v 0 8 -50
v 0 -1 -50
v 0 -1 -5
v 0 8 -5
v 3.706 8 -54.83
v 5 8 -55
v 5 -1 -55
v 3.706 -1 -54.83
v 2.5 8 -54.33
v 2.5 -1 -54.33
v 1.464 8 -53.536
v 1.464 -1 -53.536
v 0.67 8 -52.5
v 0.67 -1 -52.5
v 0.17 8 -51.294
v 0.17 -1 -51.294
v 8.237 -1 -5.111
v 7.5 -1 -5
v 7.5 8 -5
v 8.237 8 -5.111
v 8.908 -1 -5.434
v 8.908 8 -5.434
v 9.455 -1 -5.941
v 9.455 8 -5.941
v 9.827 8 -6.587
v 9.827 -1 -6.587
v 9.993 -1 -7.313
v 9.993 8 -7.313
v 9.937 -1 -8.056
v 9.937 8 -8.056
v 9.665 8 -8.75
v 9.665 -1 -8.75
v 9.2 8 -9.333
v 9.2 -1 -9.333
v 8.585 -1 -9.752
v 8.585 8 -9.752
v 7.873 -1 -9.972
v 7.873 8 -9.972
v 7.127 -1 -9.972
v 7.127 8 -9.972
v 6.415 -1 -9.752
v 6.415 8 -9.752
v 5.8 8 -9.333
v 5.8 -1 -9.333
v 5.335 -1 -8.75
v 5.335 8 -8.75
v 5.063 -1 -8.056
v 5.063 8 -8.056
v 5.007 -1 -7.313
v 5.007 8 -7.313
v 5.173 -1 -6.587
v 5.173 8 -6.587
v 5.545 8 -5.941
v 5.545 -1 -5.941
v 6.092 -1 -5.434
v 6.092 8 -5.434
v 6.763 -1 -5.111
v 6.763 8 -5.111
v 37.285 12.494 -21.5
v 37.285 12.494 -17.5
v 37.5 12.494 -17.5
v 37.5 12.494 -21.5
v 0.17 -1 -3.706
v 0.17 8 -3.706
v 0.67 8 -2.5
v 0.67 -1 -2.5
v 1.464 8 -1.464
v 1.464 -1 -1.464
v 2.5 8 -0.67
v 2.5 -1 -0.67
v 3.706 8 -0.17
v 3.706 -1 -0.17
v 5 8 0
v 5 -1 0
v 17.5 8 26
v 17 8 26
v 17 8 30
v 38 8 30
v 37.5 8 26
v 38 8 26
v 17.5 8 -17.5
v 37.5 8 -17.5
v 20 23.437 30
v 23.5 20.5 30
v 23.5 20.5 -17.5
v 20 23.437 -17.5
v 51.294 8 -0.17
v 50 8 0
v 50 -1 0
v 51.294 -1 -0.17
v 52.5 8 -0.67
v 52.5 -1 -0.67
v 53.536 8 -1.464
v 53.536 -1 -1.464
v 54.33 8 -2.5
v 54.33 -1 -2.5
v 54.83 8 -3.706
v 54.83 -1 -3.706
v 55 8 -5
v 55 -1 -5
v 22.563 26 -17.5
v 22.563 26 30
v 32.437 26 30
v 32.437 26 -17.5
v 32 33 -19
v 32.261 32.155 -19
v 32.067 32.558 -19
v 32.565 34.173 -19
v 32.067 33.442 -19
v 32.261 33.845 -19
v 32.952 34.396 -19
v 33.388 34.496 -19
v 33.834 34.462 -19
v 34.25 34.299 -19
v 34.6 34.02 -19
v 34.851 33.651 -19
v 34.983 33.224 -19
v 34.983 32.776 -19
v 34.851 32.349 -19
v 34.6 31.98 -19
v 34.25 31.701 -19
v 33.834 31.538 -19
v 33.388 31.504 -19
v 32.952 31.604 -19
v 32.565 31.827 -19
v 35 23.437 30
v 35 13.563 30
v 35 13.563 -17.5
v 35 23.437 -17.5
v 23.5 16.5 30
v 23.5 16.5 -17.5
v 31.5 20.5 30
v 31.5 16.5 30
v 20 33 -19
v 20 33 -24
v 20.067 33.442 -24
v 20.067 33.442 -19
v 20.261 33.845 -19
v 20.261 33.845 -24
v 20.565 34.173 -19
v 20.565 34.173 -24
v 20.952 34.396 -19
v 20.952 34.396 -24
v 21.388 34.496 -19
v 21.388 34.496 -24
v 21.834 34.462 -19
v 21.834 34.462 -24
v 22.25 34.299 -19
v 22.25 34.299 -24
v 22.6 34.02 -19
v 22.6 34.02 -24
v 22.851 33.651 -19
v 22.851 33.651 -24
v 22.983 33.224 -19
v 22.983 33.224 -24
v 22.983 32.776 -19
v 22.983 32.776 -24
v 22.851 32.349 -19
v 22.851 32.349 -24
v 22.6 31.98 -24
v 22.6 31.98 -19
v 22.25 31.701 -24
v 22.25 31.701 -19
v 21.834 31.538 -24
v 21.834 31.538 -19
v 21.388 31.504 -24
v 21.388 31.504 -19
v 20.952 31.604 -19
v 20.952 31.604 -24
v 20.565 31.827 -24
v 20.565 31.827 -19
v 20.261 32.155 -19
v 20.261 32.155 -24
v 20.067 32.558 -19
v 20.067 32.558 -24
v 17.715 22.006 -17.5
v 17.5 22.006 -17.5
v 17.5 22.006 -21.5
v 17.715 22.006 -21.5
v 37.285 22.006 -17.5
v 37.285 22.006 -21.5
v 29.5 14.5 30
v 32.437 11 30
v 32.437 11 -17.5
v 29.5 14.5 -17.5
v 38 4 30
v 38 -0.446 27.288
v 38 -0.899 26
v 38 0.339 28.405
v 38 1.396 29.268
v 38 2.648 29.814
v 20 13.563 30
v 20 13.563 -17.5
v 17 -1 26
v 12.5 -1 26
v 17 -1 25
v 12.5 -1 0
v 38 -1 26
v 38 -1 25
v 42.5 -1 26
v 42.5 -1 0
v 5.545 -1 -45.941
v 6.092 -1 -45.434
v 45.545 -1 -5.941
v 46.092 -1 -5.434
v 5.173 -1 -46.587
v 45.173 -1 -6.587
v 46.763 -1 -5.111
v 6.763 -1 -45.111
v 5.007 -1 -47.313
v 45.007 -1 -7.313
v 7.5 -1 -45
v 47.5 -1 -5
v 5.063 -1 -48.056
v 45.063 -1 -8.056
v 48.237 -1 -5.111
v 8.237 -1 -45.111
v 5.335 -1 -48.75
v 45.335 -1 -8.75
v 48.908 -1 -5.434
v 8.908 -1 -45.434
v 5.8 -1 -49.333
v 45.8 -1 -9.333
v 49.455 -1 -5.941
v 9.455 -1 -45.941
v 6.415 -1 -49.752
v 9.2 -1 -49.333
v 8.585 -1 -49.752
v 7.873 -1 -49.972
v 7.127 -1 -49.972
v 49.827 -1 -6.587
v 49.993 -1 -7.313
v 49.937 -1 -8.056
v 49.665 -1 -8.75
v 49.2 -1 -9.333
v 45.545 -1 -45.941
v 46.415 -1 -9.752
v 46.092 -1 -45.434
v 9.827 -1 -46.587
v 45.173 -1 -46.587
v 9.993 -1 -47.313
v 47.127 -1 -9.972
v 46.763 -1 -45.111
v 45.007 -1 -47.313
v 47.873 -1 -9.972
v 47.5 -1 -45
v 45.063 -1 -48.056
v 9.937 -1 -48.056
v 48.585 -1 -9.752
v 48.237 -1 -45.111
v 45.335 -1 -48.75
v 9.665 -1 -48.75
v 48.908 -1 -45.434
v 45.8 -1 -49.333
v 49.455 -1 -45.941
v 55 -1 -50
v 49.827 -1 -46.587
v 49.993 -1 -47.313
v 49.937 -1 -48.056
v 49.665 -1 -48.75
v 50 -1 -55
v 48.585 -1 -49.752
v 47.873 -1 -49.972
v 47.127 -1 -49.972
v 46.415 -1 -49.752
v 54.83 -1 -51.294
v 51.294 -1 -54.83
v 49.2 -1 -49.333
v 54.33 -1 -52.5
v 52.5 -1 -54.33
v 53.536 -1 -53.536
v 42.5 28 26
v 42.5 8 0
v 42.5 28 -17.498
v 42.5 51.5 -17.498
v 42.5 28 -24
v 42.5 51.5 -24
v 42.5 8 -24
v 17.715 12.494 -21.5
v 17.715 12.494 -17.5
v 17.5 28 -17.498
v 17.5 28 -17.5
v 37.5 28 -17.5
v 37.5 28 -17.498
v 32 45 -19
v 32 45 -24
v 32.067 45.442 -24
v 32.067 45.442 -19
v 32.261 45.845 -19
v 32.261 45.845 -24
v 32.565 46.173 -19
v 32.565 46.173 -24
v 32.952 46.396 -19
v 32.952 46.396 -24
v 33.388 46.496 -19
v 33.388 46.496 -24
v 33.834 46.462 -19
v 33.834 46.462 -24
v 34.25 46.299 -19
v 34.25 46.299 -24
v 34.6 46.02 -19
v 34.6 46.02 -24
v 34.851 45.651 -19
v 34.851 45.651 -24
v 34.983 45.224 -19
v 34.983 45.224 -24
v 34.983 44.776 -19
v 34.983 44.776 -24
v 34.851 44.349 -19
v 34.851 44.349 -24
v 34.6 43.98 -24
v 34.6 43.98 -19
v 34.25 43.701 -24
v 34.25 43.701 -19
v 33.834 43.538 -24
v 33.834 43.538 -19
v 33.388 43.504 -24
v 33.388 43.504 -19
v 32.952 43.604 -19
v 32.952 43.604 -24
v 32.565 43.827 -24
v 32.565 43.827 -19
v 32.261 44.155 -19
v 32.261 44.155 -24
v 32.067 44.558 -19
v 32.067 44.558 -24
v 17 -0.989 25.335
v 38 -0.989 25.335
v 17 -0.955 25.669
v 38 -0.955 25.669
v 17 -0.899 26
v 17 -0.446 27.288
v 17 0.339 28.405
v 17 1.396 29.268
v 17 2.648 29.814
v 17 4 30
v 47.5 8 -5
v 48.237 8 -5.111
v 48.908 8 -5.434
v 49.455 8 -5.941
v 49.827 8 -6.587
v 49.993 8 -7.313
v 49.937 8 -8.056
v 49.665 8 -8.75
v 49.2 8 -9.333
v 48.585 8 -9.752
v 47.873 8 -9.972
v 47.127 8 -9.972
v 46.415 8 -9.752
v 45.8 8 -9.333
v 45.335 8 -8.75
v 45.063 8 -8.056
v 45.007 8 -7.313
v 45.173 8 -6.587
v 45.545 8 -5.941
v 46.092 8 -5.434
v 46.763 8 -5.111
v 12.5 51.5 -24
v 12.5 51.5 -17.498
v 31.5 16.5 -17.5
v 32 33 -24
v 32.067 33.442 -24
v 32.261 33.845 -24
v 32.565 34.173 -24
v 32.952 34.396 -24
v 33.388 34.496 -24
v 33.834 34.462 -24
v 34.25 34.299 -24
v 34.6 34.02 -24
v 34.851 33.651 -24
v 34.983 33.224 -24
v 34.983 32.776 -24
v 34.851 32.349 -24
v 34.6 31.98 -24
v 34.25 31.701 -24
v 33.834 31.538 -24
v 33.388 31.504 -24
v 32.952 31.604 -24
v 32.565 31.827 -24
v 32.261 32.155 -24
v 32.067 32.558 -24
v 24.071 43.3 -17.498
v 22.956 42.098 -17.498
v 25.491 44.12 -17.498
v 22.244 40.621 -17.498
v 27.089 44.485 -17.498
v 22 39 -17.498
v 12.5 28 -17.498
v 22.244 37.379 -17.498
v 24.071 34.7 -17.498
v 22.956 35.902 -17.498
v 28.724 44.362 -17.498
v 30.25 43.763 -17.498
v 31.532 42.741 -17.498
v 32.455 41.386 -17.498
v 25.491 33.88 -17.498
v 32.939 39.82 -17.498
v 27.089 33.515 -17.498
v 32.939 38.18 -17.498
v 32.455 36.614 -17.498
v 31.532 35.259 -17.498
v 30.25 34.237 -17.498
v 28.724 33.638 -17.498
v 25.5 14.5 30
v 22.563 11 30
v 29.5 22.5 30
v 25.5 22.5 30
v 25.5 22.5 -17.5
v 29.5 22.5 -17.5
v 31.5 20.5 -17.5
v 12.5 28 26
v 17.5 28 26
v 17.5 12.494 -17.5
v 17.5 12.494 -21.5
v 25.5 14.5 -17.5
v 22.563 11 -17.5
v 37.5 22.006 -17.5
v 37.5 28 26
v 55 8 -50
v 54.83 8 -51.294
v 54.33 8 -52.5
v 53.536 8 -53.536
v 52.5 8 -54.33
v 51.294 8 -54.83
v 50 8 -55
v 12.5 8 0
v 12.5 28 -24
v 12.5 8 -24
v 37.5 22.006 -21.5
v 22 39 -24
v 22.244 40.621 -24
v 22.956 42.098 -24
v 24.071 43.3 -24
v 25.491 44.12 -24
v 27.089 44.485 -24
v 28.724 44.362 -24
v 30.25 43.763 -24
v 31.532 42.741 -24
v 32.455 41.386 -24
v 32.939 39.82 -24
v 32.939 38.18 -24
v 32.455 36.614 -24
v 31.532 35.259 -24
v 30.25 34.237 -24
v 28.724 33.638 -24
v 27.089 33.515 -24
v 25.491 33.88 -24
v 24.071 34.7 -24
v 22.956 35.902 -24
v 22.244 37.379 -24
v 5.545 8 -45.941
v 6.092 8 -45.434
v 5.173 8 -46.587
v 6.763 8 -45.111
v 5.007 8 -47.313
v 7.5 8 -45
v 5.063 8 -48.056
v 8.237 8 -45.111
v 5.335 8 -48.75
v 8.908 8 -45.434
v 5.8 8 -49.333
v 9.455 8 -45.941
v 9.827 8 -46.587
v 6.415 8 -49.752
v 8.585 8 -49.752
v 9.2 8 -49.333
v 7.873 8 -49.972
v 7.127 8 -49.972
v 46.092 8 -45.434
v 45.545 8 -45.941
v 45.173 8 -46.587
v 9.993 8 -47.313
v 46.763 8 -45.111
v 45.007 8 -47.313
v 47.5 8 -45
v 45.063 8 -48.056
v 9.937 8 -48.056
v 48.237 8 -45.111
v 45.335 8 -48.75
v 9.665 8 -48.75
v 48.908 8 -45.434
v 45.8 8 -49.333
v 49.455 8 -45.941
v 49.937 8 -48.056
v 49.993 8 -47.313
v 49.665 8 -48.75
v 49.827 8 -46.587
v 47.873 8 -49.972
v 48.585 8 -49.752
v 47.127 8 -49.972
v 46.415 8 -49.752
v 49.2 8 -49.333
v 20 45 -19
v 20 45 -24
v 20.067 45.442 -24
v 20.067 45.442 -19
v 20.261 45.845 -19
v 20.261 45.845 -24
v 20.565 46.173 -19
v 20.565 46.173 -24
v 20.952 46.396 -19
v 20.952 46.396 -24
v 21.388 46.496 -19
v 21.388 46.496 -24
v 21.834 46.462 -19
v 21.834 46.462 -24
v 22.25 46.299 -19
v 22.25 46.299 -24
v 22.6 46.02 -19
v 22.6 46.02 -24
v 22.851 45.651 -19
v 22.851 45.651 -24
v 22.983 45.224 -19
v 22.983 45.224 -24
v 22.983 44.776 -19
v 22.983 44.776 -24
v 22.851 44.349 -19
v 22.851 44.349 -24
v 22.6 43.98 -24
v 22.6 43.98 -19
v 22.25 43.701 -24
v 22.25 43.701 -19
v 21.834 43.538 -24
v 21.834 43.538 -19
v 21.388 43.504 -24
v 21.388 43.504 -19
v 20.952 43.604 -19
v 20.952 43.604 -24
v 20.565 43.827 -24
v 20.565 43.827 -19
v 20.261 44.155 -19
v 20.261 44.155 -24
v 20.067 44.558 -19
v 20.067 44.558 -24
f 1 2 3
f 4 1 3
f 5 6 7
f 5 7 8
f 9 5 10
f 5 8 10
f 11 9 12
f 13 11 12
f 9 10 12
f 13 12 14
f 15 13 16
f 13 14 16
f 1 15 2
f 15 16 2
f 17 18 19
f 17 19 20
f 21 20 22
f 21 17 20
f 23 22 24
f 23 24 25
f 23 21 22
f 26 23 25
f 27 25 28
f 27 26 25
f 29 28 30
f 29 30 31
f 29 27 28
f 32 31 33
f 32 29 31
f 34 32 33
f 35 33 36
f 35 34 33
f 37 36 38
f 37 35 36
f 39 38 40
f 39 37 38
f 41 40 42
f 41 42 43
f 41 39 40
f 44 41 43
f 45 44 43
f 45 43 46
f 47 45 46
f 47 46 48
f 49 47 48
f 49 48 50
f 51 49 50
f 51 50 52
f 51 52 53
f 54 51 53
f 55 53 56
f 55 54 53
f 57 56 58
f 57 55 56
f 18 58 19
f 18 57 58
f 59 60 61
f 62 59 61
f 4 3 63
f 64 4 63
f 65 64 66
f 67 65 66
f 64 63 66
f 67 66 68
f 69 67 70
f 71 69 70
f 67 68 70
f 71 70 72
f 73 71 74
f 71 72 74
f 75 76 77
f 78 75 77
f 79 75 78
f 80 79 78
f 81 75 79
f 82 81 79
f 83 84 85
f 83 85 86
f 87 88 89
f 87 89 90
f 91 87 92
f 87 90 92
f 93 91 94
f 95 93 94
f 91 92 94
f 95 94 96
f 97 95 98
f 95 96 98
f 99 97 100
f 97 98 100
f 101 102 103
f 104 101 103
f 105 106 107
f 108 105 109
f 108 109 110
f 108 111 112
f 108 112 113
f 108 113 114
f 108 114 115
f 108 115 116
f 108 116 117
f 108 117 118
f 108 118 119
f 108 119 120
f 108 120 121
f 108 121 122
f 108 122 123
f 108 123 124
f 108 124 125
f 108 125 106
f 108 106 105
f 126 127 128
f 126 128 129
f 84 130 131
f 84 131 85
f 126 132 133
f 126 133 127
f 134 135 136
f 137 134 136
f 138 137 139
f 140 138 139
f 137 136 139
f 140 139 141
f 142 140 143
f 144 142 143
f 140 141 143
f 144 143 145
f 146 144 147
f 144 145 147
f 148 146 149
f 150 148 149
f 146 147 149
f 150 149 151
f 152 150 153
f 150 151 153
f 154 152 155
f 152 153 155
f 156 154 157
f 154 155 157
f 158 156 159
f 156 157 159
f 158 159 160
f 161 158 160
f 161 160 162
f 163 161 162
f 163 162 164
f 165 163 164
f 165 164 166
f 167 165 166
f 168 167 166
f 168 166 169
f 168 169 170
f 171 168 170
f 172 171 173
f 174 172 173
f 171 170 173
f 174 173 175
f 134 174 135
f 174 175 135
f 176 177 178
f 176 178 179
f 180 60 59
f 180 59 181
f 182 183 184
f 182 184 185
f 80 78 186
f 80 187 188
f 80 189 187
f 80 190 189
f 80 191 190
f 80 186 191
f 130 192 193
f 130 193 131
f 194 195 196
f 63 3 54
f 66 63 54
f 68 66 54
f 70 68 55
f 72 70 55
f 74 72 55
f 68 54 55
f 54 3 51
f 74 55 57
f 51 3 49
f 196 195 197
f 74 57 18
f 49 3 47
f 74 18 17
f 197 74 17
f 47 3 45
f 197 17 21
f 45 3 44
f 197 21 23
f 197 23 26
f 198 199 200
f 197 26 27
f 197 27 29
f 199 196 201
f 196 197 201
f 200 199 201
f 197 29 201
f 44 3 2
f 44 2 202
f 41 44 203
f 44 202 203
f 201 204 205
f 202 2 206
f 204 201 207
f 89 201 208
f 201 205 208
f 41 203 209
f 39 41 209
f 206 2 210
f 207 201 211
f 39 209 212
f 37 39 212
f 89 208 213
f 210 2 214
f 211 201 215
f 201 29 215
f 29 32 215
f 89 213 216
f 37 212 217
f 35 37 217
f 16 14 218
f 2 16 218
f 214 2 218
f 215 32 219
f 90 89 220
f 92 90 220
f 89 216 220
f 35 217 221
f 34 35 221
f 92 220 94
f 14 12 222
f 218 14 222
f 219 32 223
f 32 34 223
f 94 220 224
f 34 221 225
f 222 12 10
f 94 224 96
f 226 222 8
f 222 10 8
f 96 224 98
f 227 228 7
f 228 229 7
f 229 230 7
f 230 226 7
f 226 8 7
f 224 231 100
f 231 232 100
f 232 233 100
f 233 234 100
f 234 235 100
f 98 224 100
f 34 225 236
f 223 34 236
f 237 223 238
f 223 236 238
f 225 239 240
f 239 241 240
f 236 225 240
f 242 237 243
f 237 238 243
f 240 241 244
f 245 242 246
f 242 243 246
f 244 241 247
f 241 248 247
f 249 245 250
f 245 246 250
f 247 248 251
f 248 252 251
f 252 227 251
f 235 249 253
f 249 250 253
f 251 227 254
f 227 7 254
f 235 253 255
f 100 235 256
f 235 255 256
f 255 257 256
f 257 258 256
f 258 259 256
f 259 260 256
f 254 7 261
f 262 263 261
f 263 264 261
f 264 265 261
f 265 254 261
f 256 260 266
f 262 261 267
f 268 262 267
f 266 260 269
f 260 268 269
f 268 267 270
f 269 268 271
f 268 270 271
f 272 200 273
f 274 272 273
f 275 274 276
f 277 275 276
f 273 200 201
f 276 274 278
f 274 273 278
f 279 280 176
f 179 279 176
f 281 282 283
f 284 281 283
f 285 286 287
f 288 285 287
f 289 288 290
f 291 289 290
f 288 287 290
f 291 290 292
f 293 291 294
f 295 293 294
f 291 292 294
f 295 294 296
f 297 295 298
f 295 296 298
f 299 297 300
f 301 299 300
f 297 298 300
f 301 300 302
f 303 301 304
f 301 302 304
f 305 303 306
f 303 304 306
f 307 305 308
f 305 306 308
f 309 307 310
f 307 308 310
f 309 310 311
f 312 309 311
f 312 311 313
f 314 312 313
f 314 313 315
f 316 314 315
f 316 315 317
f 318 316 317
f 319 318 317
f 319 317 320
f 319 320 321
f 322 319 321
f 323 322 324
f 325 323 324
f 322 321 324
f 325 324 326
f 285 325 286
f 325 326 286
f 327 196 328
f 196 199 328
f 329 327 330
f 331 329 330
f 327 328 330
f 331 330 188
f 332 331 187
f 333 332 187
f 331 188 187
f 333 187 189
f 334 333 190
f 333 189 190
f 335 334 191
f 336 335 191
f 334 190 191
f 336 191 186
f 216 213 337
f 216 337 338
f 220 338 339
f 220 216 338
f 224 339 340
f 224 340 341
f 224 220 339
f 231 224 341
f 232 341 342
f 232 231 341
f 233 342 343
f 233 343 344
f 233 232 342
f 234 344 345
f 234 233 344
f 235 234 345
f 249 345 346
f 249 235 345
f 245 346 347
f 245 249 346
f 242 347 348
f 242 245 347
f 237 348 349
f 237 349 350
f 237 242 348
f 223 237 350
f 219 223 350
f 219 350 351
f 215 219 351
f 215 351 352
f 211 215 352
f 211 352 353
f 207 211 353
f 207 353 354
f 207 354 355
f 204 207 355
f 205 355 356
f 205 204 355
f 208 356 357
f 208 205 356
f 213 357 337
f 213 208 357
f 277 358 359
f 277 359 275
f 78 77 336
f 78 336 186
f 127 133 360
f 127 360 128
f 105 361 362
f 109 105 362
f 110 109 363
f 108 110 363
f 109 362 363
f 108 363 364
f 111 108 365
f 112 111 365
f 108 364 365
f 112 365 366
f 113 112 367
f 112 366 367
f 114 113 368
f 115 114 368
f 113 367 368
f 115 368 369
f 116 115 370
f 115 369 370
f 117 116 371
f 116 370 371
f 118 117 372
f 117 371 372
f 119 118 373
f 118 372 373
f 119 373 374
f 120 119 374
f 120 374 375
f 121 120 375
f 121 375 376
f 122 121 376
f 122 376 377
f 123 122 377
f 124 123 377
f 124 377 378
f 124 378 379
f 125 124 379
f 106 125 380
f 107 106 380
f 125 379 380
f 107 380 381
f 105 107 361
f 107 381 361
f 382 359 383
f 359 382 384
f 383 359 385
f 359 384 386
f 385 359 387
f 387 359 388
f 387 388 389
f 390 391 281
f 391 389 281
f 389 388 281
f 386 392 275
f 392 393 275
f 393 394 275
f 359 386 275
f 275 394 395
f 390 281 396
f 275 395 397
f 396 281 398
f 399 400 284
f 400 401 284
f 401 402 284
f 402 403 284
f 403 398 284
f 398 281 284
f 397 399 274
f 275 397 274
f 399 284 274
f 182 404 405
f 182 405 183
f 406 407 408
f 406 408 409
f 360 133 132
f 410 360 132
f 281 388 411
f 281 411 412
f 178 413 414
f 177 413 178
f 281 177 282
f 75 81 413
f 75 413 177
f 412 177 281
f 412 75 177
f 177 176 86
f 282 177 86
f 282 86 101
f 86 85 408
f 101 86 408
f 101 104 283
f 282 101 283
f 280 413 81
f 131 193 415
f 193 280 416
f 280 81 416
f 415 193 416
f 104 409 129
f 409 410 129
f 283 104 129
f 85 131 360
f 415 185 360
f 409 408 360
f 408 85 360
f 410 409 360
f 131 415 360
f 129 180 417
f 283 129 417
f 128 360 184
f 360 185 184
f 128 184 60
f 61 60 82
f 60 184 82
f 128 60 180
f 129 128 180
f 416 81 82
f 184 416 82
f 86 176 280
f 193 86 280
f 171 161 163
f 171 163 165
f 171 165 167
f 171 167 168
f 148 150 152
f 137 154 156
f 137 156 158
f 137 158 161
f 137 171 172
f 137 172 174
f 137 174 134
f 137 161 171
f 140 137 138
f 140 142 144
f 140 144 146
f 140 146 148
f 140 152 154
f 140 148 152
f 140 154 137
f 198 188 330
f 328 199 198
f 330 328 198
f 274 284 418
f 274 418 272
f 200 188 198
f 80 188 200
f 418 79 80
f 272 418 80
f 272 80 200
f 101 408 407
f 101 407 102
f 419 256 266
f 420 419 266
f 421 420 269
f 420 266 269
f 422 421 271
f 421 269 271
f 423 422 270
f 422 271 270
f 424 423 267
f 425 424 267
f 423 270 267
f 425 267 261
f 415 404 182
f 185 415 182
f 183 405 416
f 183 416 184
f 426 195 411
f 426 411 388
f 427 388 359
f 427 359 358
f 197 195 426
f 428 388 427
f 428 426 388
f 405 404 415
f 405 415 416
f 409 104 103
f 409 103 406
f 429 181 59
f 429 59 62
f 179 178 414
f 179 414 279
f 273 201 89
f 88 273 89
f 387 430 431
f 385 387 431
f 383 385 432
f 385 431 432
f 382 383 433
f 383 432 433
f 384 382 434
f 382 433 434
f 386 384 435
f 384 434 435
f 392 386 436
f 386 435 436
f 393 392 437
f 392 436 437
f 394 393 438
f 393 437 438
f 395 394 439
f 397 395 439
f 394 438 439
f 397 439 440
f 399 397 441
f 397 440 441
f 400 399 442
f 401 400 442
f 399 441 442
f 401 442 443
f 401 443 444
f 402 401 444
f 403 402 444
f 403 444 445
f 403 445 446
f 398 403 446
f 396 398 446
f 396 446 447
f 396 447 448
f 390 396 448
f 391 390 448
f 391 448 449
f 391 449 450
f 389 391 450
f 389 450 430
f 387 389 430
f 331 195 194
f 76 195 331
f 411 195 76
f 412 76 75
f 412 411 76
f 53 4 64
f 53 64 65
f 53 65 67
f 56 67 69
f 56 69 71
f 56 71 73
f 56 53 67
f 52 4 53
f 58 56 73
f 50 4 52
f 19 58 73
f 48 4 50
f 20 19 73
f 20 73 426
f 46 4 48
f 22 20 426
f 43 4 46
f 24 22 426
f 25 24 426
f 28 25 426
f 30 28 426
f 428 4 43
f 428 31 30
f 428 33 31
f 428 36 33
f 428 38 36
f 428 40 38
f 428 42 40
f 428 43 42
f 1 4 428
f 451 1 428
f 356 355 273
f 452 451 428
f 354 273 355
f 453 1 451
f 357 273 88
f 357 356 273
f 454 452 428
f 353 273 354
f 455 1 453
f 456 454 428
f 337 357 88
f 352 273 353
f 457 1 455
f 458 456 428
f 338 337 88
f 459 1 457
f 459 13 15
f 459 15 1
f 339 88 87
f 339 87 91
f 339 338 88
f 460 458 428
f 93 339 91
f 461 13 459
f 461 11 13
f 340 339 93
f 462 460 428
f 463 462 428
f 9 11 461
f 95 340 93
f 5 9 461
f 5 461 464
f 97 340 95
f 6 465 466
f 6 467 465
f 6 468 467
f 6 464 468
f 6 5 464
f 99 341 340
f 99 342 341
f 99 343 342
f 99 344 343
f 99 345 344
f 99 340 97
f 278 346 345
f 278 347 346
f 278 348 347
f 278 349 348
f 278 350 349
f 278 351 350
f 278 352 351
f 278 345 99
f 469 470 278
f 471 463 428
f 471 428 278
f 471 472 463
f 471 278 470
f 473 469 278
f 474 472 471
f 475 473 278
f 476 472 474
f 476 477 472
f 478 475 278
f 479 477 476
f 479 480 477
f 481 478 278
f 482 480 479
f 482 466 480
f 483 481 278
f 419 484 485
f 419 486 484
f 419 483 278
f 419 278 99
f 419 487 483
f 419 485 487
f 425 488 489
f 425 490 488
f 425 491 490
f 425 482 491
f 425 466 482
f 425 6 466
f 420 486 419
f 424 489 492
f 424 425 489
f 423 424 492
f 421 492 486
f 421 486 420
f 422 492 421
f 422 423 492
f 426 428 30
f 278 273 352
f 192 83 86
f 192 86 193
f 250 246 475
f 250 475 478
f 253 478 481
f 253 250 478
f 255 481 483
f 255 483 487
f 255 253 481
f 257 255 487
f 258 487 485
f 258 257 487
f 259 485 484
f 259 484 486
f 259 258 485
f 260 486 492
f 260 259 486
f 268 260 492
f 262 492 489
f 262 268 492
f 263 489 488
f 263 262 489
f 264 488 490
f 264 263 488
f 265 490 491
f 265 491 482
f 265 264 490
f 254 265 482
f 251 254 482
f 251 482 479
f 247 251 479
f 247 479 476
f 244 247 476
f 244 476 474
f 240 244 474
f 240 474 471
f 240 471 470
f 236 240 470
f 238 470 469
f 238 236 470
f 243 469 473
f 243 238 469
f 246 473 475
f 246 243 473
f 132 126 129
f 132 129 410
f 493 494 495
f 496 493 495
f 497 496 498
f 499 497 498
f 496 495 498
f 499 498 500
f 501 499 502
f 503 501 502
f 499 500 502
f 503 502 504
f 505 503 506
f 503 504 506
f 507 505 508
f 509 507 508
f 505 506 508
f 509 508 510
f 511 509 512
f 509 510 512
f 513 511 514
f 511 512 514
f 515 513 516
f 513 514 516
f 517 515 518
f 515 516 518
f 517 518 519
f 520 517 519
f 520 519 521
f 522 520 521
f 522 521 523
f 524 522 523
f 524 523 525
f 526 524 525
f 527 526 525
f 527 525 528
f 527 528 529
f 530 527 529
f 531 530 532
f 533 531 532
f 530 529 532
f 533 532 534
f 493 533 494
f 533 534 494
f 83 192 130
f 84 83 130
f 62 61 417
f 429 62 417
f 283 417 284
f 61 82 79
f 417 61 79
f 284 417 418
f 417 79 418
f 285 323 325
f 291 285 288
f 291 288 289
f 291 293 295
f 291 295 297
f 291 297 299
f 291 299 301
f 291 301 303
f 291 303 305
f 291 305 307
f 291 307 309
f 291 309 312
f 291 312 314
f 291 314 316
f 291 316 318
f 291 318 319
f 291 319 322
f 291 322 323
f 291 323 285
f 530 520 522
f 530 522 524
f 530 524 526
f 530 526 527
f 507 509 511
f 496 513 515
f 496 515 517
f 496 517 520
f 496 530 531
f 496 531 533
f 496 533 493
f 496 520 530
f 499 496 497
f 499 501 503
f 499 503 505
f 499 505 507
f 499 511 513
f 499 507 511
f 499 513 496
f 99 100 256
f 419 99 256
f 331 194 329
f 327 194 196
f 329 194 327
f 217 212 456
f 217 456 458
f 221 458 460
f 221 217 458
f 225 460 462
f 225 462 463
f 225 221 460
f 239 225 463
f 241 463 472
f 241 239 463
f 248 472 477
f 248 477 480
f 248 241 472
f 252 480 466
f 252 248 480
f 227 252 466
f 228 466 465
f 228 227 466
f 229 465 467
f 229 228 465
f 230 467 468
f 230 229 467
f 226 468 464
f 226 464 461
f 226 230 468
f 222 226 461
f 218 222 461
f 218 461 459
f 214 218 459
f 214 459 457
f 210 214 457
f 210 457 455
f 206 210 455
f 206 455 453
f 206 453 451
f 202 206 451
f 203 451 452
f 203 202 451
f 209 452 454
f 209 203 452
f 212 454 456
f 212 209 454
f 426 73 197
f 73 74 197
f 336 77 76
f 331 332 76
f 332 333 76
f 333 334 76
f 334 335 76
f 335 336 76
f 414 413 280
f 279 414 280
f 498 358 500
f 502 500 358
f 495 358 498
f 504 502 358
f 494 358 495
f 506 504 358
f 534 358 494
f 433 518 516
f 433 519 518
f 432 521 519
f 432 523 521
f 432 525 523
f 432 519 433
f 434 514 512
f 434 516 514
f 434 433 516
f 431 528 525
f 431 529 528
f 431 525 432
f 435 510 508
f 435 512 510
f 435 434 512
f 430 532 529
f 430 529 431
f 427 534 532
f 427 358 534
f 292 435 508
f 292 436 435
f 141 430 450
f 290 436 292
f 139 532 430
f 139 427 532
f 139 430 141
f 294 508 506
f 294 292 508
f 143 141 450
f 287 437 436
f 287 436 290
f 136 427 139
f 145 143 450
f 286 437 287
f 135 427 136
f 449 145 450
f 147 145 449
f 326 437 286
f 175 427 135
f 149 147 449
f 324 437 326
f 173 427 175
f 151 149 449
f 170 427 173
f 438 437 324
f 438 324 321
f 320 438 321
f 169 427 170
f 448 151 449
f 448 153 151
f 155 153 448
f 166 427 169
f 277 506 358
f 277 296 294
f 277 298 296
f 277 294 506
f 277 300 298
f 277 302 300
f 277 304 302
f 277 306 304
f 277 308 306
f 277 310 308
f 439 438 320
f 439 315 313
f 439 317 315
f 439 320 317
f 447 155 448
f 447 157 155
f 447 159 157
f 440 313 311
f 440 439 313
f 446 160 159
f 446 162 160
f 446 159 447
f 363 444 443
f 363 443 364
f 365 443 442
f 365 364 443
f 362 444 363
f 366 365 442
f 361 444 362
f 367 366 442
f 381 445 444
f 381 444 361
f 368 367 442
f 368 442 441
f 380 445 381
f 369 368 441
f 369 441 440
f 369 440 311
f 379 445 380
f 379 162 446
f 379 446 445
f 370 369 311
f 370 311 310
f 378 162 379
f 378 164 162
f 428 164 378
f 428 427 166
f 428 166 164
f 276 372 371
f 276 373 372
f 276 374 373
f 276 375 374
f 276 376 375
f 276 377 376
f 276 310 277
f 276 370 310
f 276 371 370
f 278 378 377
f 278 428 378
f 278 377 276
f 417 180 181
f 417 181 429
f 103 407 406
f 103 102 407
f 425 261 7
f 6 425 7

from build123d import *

# Parameters (mm, degrees)
BOSS_EXTRUDE2_DEPTH       = 8
BOSS_EXTRUDE2_DEPTH_BACK  = 1
SKETCH1_R                 = 2.5
SKETCH5_W                 = 9
SKETCH5_H                 = 6.5
BOSS_EXTRUDE3_DEPTH       = 14.5
CUT_EXTRUDE4_DEPTH        = 1.5
SKETCH12_W                = 21
SKETCH12_H                = 30
BOSS_EXTRUDE7_DEPTH       = 9
SKETCH15_W                = 9
SKETCH15_H                = 6.5
BOSS_EXTRUDE8_DEPTH       = 3.5
BOSS_EXTRUDE9_DEPTH       = 54
FILLET4_R                 = 5
SKETCH18_W                = 9.873697418
SKETCH18_H                = 6.5
BOSS_EXTRUDE11_DEPTH      = 0.5
SKETCH20_W                = 4
SKETCH20_H                = 17.5
BOSS_EXTRUDE12_DEPTH      = 18
BOSS_EXTRUDE13_DEPTH      = 11
BOSS_EXTRUDE13_DEPTH_BACK = 4
SKETCH22_W                = 17.5
SKETCH22_H                = 4
SKETCH25_W                = 2
SKETCH25_H                = 17.5
BOSS_EXTRUDE14_DEPTH      = 41
SKETCH28_W                = 41
SKETCH28_H                = 45
BOSS_EXTRUDE15_DEPTH      = 2
SKETCH29_R                = 1.75
CUT_EXTRUDE8_DEPTH        = 9
BOSS_EXTRUDE16_DEPTH      = 9
BOSS_EXTRUDE16_DEPTH_BACK = 4
SKETCH30_W                = 17.5
SKETCH30_H                = 4
SKETCH31_R                = 10
CUT_EXTRUDE9_DEPTH        = 9
SKETCH32_W                = 13
SKETCH32_H                = 4
BOSS_EXTRUDE17_DEPTH      = 23.5
SKETCH33_W                = 0.5
SKETCH33_H                = 17.5
BOSS_EXTRUDE18_DEPTH      = 20
BOSS_EXTRUDE19_DEPTH      = 26
SKETCH35_W                = 9.873697418
SKETCH35_H                = 0.5
BOSS_EXTRUDE20_DEPTH      = 47.5
BOSS_EXTRUDE21_DEPTH      = 47.5
SKETCH38_W                = 0.419549816
SKETCH38_H                = 18.5
CUT_EXTRUDE10_DEPTH       = 90.5
BOSS_EXTRUDE23_DEPTH      = 47.5
SKETCH48_W                = 15.5
SKETCH48_H                = 6.5
BOSS_EXTRUDE31_DEPTH      = 18.5
SKETCH51_W                = 9.626242636
SKETCH51_H                = 9.125298808
BOSS_EXTRUDE32_DEPTH      = 1.5
SKETCH54_W                = 8
SKETCH54_H                = 8
BOSS_EXTRUDE35_DEPTH      = 47.5
SKETCH55_W                = 9.873697418
SKETCH55_H                = 0.5
CUT_EXTRUDE12_DEPTH       = 47.5
SKETCH56_W                = 0.5
SKETCH56_H                = 20
BOSS_EXTRUDE36_DEPTH      = 43.5
BOSS_EXTRUDE37_DEPTH      = 47.5
SKETCH58_W                = 0.715052156
SKETCH58_H                = 9.51279705
CUT_EXTRUDE13_DEPTH       = 4
CUT_EXTRUDE15_DEPTH       = 47.5
SKETCH60_W                = 0.215052156
SKETCH60_H                = 9.51279705
CUT_EXTRUDE16_DEPTH       = 47.5
CUT_EXTRUDE17_DEPTH       = 47.5
SKETCH62_W                = 8
SKETCH62_H                = 8
CUT_EXTRUDE18_DEPTH       = 47.5
SKETCH63_W                = 13
SKETCH63_H                = 4
CUT_EXTRUDE20_DEPTH       = 17
SKETCH64_W                = 1
SKETCH64_H                = 1.5
BOSS_EXTRUDE38_DEPTH      = 6.5
SKETCH68_W                = 2
SKETCH68_H                = 45
CUT_EXTRUDE23_DEPTH       = 17
SKETCH69_W                = 2
SKETCH69_H                = 41
CUT_EXTRUDE24_DEPTH       = 37
CUT_EXTRUDE25_DEPTH       = 6.5
SKETCH72_W                = 43.5
SKETCH72_H                = 4
CUT_EXTRUDE26_DEPTH       = 11
SKETCH73_W                = 43.5
SKETCH73_H                = 4
CUT_EXTRUDE27_DEPTH       = 9
SKETCH74_W                = 6.5
SKETCH74_H                = 18.5
CUT_EXTRUDE28_DEPTH       = 5
SKETCH75_W                = 6.5
SKETCH75_H                = 18.5
CUT_EXTRUDE30_DEPTH       = 5
SKETCH76_W                = 30
SKETCH76_H                = 6.5
BOSS_EXTRUDE39_DEPTH      = 1.5
SKETCH81_W                = 30
SKETCH81_H                = 6.501554737
BOSS_EXTRUDE44_DEPTH      = 23.5
SKETCH82_R                = 1.5
CUT_EXTRUDE31_DEPTH       = 5
CUT_EXTRUDE32_REACH       = 94.7
SKETCH82_4_R              = 5.5


with BuildPart() as part:
    # Sketch1 → Boss-Extrude2 (new, two sides: drawn at the far end of the back side and taken through both)
    with BuildSketch(Plane(origin=(0, 0, 0), x_dir=(1, 0, 0), z_dir=(0, 1, 0)).offset(-BOSS_EXTRUDE2_DEPTH_BACK)):
        with BuildLine():
            Line((5, 0), (50, 0))
            ThreePointArc((50, 0), (53.535533906, 1.464466094), (55, 5))
            Line((55, 5), (55, 50))
            ThreePointArc((55, 50), (53.535533906, 53.535533906), (50, 55))
            Line((50, 55), (5, 55))
            ThreePointArc((5, 55), (1.464466094, 53.535533906), (0, 50))
            Line((0, 50), (0, 5))
            ThreePointArc((0, 5), (1.464466094, 1.464466094), (5, 0))
        make_face()
        with Locations((7.5, 47.5)):
            Circle(SKETCH1_R, mode=Mode.SUBTRACT)
        with Locations((47.5, 47.5)):
            Circle(SKETCH1_R, mode=Mode.SUBTRACT)
        with Locations((47.5, 7.5)):
            Circle(SKETCH1_R, mode=Mode.SUBTRACT)
        with Locations((7.5, 7.5)):
            Circle(SKETCH1_R, mode=Mode.SUBTRACT)
    extrude(amount=BOSS_EXTRUDE2_DEPTH + BOSS_EXTRUDE2_DEPTH_BACK)

    # Sketch5 → Boss-Extrude3 (add)
    with BuildSketch(Plane(origin=(0, 8, 0), x_dir=(1, 0, 0), z_dir=(0, 1, 0))):
        with Locations((27.5, 20.75)):
            Rectangle(SKETCH5_W, SKETCH5_H)
    extrude(amount=BOSS_EXTRUDE3_DEPTH)

    # Sketch6 → Cut-Extrude4 (cut)
    with BuildSketch(Plane(origin=(0, 0, -24), x_dir=(-1, 0, 0), z_dir=(0, 0, -1))):
        with BuildLine():
            ThreePointArc((-27.5, 13), (-24.671572875, 14.171572875), (-23.5, 17))
            ThreePointArc((-23.5, 17), (-30.328427125, 19.828427125), (-27.5, 13))
        make_face()
    extrude(amount=-CUT_EXTRUDE4_DEPTH, mode=Mode.SUBTRACT)

    # Sketch12 → Boss-Extrude7 (add)
    with BuildSketch(Plane(origin=(0, 8, 0), x_dir=(1, 0, 0), z_dir=(0, 1, 0))):
        with Locations((27.5, -15)):
            Rectangle(SKETCH12_W, SKETCH12_H)
    extrude(amount=-BOSS_EXTRUDE7_DEPTH)

    # Sketch15 → Boss-Extrude8 (add)
    with BuildSketch(Plane(origin=(0, 22.5, 0), x_dir=(1, 0, 0), z_dir=(0, 1, 0))):
        with Locations((27.5, 20.75)):
            Rectangle(SKETCH15_W, SKETCH15_H)
    extrude(amount=BOSS_EXTRUDE8_DEPTH)

    # Sketch11 → Boss-Extrude9 (add)
    with BuildSketch(Plane(origin=(0, 0, -24), x_dir=(-1, 0, 0), z_dir=(0, 0, -1))):
        Polygon((-29.5, 22.5), (-25.5, 22.5), (-22.563151291, 26), (-32.436848709, 26), align=None)
    extrude(amount=-BOSS_EXTRUDE9_DEPTH)

    # Fillet4
    fillet4_edges = [part.edges().sort_by_distance(p)[0] for p in [
        (27.5, -1, 30),
    ]]
    fillet(fillet4_edges, radius=FILLET4_R)

    # Sketch18 → Boss-Extrude11 (add)
    with BuildSketch(Plane(origin=(0, 26, 0), x_dir=(1, 0, 0), z_dir=(0, 1, 0))):
        with Locations((27.5, 20.75)):
            Rectangle(SKETCH18_W, SKETCH18_H)
    extrude(amount=BOSS_EXTRUDE11_DEPTH)

    # Sketch20 → Boss-Extrude12 (add)
    with BuildSketch(Plane(origin=(0, 8, 0), x_dir=(1, 0, 0), z_dir=(0, 1, 0))):
        with Locations((14.5, 8.75)):
            Rectangle(SKETCH20_W, SKETCH20_H)
        with Locations((40.5, 8.75)):
            Rectangle(SKETCH20_W, SKETCH20_H)
    extrude(amount=BOSS_EXTRUDE12_DEPTH)

    # Sketch22 → Boss-Extrude13 (add, two sides: drawn at the far end of the back side and taken through both)
    with BuildSketch(Plane.ZY.offset(-12.5).offset(-BOSS_EXTRUDE13_DEPTH_BACK)):
        with Locations((-8.75, 26)):
            Rectangle(SKETCH22_W, SKETCH22_H)
    extrude(amount=BOSS_EXTRUDE13_DEPTH + BOSS_EXTRUDE13_DEPTH_BACK)

    # Sketch25 → Boss-Extrude14 (add)
    with BuildSketch(Plane(origin=(0, 28, 0), x_dir=(1, 0, 0), z_dir=(0, 1, 0))):
        with Locations((2.5, 8.75)):
            Rectangle(SKETCH25_W, SKETCH25_H)
    extrude(amount=BOSS_EXTRUDE14_DEPTH)

    # Sketch28 → Boss-Extrude15 (add)
    with BuildSketch(Plane.ZY.offset(-1.5)):
        with Locations((-20.5, 46.5)):
            Rectangle(SKETCH28_W, SKETCH28_H)
    extrude(amount=-BOSS_EXTRUDE15_DEPTH)

    # Sketch29 → Cut-Extrude8 (cut)
    with BuildSketch(Plane.ZY.offset(-1.5)):
        with Locations((-5, 33)):
            Circle(SKETCH29_R)
        with Locations((-36, 33)):
            Circle(SKETCH29_R)
        with Locations((-36, 64)):
            Circle(SKETCH29_R)
        with Locations((-5, 64)):
            Circle(SKETCH29_R)
    extrude(amount=-CUT_EXTRUDE8_DEPTH, mode=Mode.SUBTRACT)

    # Sketch30 → Boss-Extrude16 (add, two sides: drawn at the far end of the back side and taken through both)
    with BuildSketch(Plane(origin=(42.5, 0, 0), x_dir=(0, 0, -1), z_dir=(1, 0, 0)).offset(-BOSS_EXTRUDE16_DEPTH_BACK)):
        with Locations((8.75, 26)):
            Rectangle(SKETCH30_W, SKETCH30_H)
    extrude(amount=BOSS_EXTRUDE16_DEPTH + BOSS_EXTRUDE16_DEPTH_BACK)

    # Sketch31 → Cut-Extrude9 (cut)
    with BuildSketch(Plane(origin=(3.5, 0, 0), x_dir=(0, 0, -1), z_dir=(1, 0, 0))):
        with Locations((20.5, 47)):
            Circle(SKETCH31_R)
    extrude(amount=-CUT_EXTRUDE9_DEPTH, mode=Mode.SUBTRACT)

    # Sketch32 → Boss-Extrude17 (add)
    with BuildSketch(Plane(origin=(0, 0, -17.5), x_dir=(-1, 0, 0), z_dir=(0, 0, -1))):
        with Locations((-10, 26)):
            Rectangle(SKETCH32_W, SKETCH32_H)
    extrude(amount=BOSS_EXTRUDE17_DEPTH)

    # Sketch33 → Boss-Extrude18 (add)
    with BuildSketch(Plane(origin=(0, 8, 0), x_dir=(1, 0, 0), z_dir=(0, 1, 0))):
        with Locations((38.25, 8.75)):
            Rectangle(SKETCH33_W, SKETCH33_H)
        with Locations((16.75, 8.75)):
            Rectangle(SKETCH33_W, SKETCH33_H)
    extrude(amount=BOSS_EXTRUDE18_DEPTH)

    # Sketch34 → Boss-Extrude19 (add)
    with BuildSketch(Plane.XY):
        Polygon((51.5, 24), (51.5, 28), (38, 28), (38, -1), (42.5, -1), (42.5, 24), align=None)
        Polygon((17, 28), (1.5, 28), (1.5, 24), (12.5, 24), (12.5, -1), (17, -1), align=None)
    extrude(amount=BOSS_EXTRUDE19_DEPTH)

    # Sketch35 → Boss-Extrude20 (add)
    with BuildSketch(Plane.XY.offset(-17.5)):
        with Locations((27.5, 26.25)):
            Rectangle(SKETCH35_W, SKETCH35_H)
    extrude(amount=BOSS_EXTRUDE20_DEPTH)

    # Sketch37 → Boss-Extrude21 (add)
    with BuildSketch(Plane.XY.offset(-17.5)):
        Polygon((29.5, 12), (25.5, 12), (21.863844179, 7.666598237), (33.136155821, 7.666598237), align=None)
    extrude(amount=BOSS_EXTRUDE21_DEPTH)

    # Sketch38 → Cut-Extrude10 (cut)
    with BuildSketch(Plane.XY.offset(30)):
        with Locations((22.353376383, 17.25)):
            Rectangle(SKETCH38_W, SKETCH38_H)
        with Locations((32.646623617, 17.25)):
            Rectangle(SKETCH38_W, SKETCH38_H)
    extrude(amount=-CUT_EXTRUDE10_DEPTH, mode=Mode.SUBTRACT)

    # Sketch39 → Boss-Extrude23 (add)
    with BuildSketch(Plane.XY.offset(30)):
        Polygon((38, 22.006398525), (37.284947844, 22.006398525), (34, 19.25), (34, 15.25), (37.284947844, 12.493601475), (38, 12.493601475), align=None)
        Polygon((21, 19.25), (17.715052156, 22.006398525), (17, 22.006398525), (17, 12.493601475), (17.715052156, 12.493601475), (21, 15.25), align=None)
    extrude(amount=-BOSS_EXTRUDE23_DEPTH)

    # Sketch48 → Boss-Extrude31 (add)
    with BuildSketch(Plane(origin=(0, 8, 0), x_dir=(1, 0, 0), z_dir=(0, 1, 0))):
        with Locations((15.25, 20.75)):
            Rectangle(SKETCH48_W, SKETCH48_H)
        with Locations((39.75, 20.75)):
            Rectangle(SKETCH48_W, SKETCH48_H)
    extrude(amount=BOSS_EXTRUDE31_DEPTH)

    # Sketch51 → Boss-Extrude32 (add)
    with BuildSketch(Plane(origin=(0, 0, -24), x_dir=(-1, 0, 0), z_dir=(0, 0, -1))):
        with Locations((-27.646184708, 17.114099589)):
            Rectangle(SKETCH51_W, SKETCH51_H)
    extrude(amount=-BOSS_EXTRUDE32_DEPTH)

    # Sketch54 → Boss-Extrude35 (add)
    with BuildSketch(Plane.XY.offset(-17.5)):
        with Locations((27.5, 18.5)):
            Rectangle(SKETCH54_W, SKETCH54_H)
    extrude(amount=BOSS_EXTRUDE35_DEPTH)

    # Sketch55 → Cut-Extrude12 (cut)
    with BuildSketch(Plane.XY.offset(30)):
        with Locations((27.5, 26.25)):
            Rectangle(SKETCH55_W, SKETCH55_H)
    extrude(amount=-CUT_EXTRUDE12_DEPTH, mode=Mode.SUBTRACT)

    # Sketch56 → Boss-Extrude36 (add)
    with BuildSketch(Plane.XY.offset(26)):
        with Locations((37.75, 18)):
            Rectangle(SKETCH56_W, SKETCH56_H)
        with Locations((17.25, 18)):
            Rectangle(SKETCH56_W, SKETCH56_H)
    extrude(amount=-BOSS_EXTRUDE36_DEPTH)

    # Sketch57 → Boss-Extrude37 (add)
    with BuildSketch(Plane.XY.offset(30)):
        Polygon((35, 23.436848709), (31.5, 20.5), (31.5, 16.5), (35, 13.563151291), align=None)
        Polygon((20, 13.563151291), (23.5, 16.5), (23.5, 20.5), (20, 23.436848709), align=None)
        Polygon((32.436848709, 11), (29.5, 14.5), (25.5, 14.5), (22.563151291, 11), align=None)
    extrude(amount=-BOSS_EXTRUDE37_DEPTH)

    # Sketch58 → Cut-Extrude13 (cut)
    with BuildSketch(Plane.XY.offset(30)):
        with Locations((37.642473922, 17.25)):
            Rectangle(SKETCH58_W, SKETCH58_H)
        with Locations((17.357526078, 17.25)):
            Rectangle(SKETCH58_W, SKETCH58_H)
    extrude(amount=-CUT_EXTRUDE13_DEPTH, mode=Mode.SUBTRACT)

    # Sketch59 → Cut-Extrude15 (cut)
    with BuildSketch(Plane.XY.offset(30)):
        Polygon((37.284947844, 22.006398525), (35, 20.089099631), (35, 14.410900369), (37.284947844, 12.493601475), align=None)
        Polygon((17.715052156, 22.006398525), (20, 20.089099631), (20, 14.410900369), (17.715052156, 12.493601475), align=None)
    extrude(amount=-CUT_EXTRUDE15_DEPTH, mode=Mode.SUBTRACT)

    # Sketch60 → Cut-Extrude16 (cut)
    with BuildSketch(Plane.XY.offset(26)):
        with Locations((37.392473922, 17.25)):
            Rectangle(SKETCH60_W, SKETCH60_H)
        with Locations((17.607526078, 17.25)):
            Rectangle(SKETCH60_W, SKETCH60_H)
    extrude(amount=-CUT_EXTRUDE16_DEPTH, mode=Mode.SUBTRACT)

    # Sketch61 → Cut-Extrude17 (cut)
    with BuildSketch(Plane.XY.offset(30)):
        Polygon((32.436848709, 8), (22.563151291, 8), (22.563151291, 8.5), (24.660900369, 11), (30.339099631, 11), (32.436848709, 8.5), align=None)
    extrude(amount=-CUT_EXTRUDE17_DEPTH, mode=Mode.SUBTRACT)

    # Sketch62 → Cut-Extrude18 (cut)
    with BuildSketch(Plane.XY.offset(30)):
        with Locations((27.5, 18.5)):
            Rectangle(SKETCH62_W, SKETCH62_H)
    extrude(amount=-CUT_EXTRUDE18_DEPTH, mode=Mode.SUBTRACT)

    # Sketch63 → Cut-Extrude20 (cut)
    with BuildSketch(Plane(origin=(0, 0, -41), x_dir=(-1, 0, 0), z_dir=(0, 0, -1))):
        with Locations((-10, 26)):
            Rectangle(SKETCH63_W, SKETCH63_H)
    extrude(amount=-CUT_EXTRUDE20_DEPTH, mode=Mode.SUBTRACT)

    # Sketch64 → Boss-Extrude38 (add)
    with BuildSketch(Plane(origin=(0, 0, -17.5), x_dir=(-1, 0, 0), z_dir=(0, 0, -1))):
        with Locations((-17, 27.25)):
            Rectangle(SKETCH64_W, SKETCH64_H)
    extrude(amount=BOSS_EXTRUDE38_DEPTH)

    # Sketch68 → Cut-Extrude23 (cut)
    with BuildSketch(Plane(origin=(0, 0, -41), x_dir=(-1, 0, 0), z_dir=(0, 0, -1))):
        with Locations((-2.5, 46.5)):
            Rectangle(SKETCH68_W, SKETCH68_H)
    extrude(amount=-CUT_EXTRUDE23_DEPTH, mode=Mode.SUBTRACT)

    # Sketch69 → Cut-Extrude24 (cut)
    with BuildSketch(Plane(origin=(0, 0, -24), x_dir=(-1, 0, 0), z_dir=(0, 0, -1))):
        with Locations((-2.5, 48.5)):
            Rectangle(SKETCH69_W, SKETCH69_H)
    extrude(amount=-CUT_EXTRUDE24_DEPTH, mode=Mode.SUBTRACT)

    # Sketch70 → Cut-Extrude25 (cut)
    with BuildSketch(Plane(origin=(0, 0, -24), x_dir=(-1, 0, 0), z_dir=(0, 0, -1))):
        Polygon((-17.5, 28), (-17.5, 26.5), (-7.5, 26.5), (-7.5, 24), (-1.5, 24), (-1.5, 28), align=None)
    extrude(amount=-CUT_EXTRUDE25_DEPTH, mode=Mode.SUBTRACT)

    # Sketch72 → Cut-Extrude26 (cut)
    with BuildSketch(Plane.ZY.offset(-1.5)):
        with Locations((4.25, 26)):
            Rectangle(SKETCH72_W, SKETCH72_H)
    extrude(amount=-CUT_EXTRUDE26_DEPTH, mode=Mode.SUBTRACT)

    # Sketch73 → Cut-Extrude27 (cut)
    with BuildSketch(Plane(origin=(51.5, 0, 0), x_dir=(0, 0, -1), z_dir=(1, 0, 0))):
        with Locations((-4.25, 26)):
            Rectangle(SKETCH73_W, SKETCH73_H)
    extrude(amount=-CUT_EXTRUDE27_DEPTH, mode=Mode.SUBTRACT)

    # Sketch74 → Cut-Extrude28 (cut)
    with BuildSketch(Plane.ZY.offset(-7.5)):
        with Locations((-20.75, 17.25)):
            Rectangle(SKETCH74_W, SKETCH74_H)
    extrude(amount=-CUT_EXTRUDE28_DEPTH, mode=Mode.SUBTRACT)

    # Sketch75 → Cut-Extrude30 (cut)
    with BuildSketch(Plane(origin=(47.5, 0, 0), x_dir=(0, 0, -1), z_dir=(1, 0, 0))):
        with Locations((20.75, 17.25)):
            Rectangle(SKETCH75_W, SKETCH75_H)
    extrude(amount=-CUT_EXTRUDE30_DEPTH, mode=Mode.SUBTRACT)

    # Sketch76 → Boss-Extrude39 (add)
    with BuildSketch(Plane(origin=(0, 26.5, 0), x_dir=(1, 0, 0), z_dir=(0, 1, 0))):
        with Locations((27.5, 20.75)):
            Rectangle(SKETCH76_W, SKETCH76_H)
    extrude(amount=BOSS_EXTRUDE39_DEPTH)

    # Sketch81 → Boss-Extrude44 (add)
    with BuildSketch(Plane(origin=(0, 28, 0), x_dir=(1, 0, 0), z_dir=(0, 1, 0))):
        with Locations((27.5, 20.749222632)):
            Rectangle(SKETCH81_W, SKETCH81_H)
    extrude(amount=BOSS_EXTRUDE44_DEPTH)

    # Sketch82 → Cut-Extrude31 (cut)
    with BuildSketch(Plane(origin=(0, 0, -24), x_dir=(-1, 0, 0), z_dir=(0, 0, -1))):
        with Locations((-33.5, 45)):
            Circle(SKETCH82_R)
        with Locations((-21.5, 45)):
            Circle(SKETCH82_R)
        with Locations((-21.5, 33)):
            Circle(SKETCH82_R)
        with Locations((-33.5, 33)):
            Circle(SKETCH82_R)
    extrude(amount=-CUT_EXTRUDE31_DEPTH, mode=Mode.SUBTRACT)

    # Sketch82<4> → Cut-Extrude32 (cut, up to next)
    with BuildSketch(Plane(origin=(0, 0, -24), x_dir=(-1, 0, 0), z_dir=(0, 0, -1)), mode=Mode.PRIVATE) as cut_extrude32_sk1:
        with Locations((-27.5, 39)):
            Circle(SKETCH82_4_R)
    cut_extrude32_tool1 = extrude(cut_extrude32_sk1.sketch, amount=-CUT_EXTRUDE32_REACH, mode=Mode.PRIVATE) & part.part
    add(cut_extrude32_tool1.solids().sort_by_distance((27.5, 39, -24))[0], mode=Mode.SUBTRACT)


solid = part.part
